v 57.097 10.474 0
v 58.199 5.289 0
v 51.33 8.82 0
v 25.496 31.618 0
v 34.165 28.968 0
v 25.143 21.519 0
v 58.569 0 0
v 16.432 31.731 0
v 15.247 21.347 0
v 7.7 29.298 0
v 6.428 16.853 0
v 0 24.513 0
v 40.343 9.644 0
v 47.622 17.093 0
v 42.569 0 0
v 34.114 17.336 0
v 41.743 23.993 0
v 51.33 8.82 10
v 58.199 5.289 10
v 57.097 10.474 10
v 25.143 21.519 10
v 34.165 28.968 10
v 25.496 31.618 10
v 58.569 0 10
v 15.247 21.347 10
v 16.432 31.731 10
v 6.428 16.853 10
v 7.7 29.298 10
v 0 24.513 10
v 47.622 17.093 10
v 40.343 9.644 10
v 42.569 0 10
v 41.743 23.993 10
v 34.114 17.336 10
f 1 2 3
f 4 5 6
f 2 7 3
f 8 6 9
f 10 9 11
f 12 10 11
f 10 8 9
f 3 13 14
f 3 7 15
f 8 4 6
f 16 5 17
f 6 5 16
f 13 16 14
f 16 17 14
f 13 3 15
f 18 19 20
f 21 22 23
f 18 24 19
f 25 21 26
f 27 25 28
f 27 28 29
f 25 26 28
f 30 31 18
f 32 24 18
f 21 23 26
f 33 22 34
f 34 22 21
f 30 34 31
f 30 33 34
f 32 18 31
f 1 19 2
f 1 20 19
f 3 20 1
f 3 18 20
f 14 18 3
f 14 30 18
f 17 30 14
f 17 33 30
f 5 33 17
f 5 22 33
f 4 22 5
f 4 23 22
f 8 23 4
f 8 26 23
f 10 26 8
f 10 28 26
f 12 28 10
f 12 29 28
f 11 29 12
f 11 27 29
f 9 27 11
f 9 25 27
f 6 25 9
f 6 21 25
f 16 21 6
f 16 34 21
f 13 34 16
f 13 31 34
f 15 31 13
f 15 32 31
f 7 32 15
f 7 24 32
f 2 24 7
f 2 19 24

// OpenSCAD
$fn = 32;

// ----------------------------------------------------------------------
// Arc stop: segment, 10 mm thick
// ----------------------------------------------------------------------

// --- parameters (mm) ---
profile_height = 10;      // extrusion height
profile_points = 17;      // points of the closed outline

profile = [[58.569, 0], [58.199, 5.289], [57.097, 10.474], [51.33, 8.82], [47.622, 17.093], [41.743, 23.993], [34.165, 28.968], [25.496, 31.618], [16.432, 31.731], [7.7, 29.298], [0, 24.513], [6.428, 16.853], [15.247, 21.347], [25.143, 21.519], [34.114, 17.336], [40.343, 9.644], [42.569, 0]];  // single closed polygon, 17 points, counter clockwise

// --- the one profile operation ---
linear_extrude(height = profile_height) polygon(points = profile);
